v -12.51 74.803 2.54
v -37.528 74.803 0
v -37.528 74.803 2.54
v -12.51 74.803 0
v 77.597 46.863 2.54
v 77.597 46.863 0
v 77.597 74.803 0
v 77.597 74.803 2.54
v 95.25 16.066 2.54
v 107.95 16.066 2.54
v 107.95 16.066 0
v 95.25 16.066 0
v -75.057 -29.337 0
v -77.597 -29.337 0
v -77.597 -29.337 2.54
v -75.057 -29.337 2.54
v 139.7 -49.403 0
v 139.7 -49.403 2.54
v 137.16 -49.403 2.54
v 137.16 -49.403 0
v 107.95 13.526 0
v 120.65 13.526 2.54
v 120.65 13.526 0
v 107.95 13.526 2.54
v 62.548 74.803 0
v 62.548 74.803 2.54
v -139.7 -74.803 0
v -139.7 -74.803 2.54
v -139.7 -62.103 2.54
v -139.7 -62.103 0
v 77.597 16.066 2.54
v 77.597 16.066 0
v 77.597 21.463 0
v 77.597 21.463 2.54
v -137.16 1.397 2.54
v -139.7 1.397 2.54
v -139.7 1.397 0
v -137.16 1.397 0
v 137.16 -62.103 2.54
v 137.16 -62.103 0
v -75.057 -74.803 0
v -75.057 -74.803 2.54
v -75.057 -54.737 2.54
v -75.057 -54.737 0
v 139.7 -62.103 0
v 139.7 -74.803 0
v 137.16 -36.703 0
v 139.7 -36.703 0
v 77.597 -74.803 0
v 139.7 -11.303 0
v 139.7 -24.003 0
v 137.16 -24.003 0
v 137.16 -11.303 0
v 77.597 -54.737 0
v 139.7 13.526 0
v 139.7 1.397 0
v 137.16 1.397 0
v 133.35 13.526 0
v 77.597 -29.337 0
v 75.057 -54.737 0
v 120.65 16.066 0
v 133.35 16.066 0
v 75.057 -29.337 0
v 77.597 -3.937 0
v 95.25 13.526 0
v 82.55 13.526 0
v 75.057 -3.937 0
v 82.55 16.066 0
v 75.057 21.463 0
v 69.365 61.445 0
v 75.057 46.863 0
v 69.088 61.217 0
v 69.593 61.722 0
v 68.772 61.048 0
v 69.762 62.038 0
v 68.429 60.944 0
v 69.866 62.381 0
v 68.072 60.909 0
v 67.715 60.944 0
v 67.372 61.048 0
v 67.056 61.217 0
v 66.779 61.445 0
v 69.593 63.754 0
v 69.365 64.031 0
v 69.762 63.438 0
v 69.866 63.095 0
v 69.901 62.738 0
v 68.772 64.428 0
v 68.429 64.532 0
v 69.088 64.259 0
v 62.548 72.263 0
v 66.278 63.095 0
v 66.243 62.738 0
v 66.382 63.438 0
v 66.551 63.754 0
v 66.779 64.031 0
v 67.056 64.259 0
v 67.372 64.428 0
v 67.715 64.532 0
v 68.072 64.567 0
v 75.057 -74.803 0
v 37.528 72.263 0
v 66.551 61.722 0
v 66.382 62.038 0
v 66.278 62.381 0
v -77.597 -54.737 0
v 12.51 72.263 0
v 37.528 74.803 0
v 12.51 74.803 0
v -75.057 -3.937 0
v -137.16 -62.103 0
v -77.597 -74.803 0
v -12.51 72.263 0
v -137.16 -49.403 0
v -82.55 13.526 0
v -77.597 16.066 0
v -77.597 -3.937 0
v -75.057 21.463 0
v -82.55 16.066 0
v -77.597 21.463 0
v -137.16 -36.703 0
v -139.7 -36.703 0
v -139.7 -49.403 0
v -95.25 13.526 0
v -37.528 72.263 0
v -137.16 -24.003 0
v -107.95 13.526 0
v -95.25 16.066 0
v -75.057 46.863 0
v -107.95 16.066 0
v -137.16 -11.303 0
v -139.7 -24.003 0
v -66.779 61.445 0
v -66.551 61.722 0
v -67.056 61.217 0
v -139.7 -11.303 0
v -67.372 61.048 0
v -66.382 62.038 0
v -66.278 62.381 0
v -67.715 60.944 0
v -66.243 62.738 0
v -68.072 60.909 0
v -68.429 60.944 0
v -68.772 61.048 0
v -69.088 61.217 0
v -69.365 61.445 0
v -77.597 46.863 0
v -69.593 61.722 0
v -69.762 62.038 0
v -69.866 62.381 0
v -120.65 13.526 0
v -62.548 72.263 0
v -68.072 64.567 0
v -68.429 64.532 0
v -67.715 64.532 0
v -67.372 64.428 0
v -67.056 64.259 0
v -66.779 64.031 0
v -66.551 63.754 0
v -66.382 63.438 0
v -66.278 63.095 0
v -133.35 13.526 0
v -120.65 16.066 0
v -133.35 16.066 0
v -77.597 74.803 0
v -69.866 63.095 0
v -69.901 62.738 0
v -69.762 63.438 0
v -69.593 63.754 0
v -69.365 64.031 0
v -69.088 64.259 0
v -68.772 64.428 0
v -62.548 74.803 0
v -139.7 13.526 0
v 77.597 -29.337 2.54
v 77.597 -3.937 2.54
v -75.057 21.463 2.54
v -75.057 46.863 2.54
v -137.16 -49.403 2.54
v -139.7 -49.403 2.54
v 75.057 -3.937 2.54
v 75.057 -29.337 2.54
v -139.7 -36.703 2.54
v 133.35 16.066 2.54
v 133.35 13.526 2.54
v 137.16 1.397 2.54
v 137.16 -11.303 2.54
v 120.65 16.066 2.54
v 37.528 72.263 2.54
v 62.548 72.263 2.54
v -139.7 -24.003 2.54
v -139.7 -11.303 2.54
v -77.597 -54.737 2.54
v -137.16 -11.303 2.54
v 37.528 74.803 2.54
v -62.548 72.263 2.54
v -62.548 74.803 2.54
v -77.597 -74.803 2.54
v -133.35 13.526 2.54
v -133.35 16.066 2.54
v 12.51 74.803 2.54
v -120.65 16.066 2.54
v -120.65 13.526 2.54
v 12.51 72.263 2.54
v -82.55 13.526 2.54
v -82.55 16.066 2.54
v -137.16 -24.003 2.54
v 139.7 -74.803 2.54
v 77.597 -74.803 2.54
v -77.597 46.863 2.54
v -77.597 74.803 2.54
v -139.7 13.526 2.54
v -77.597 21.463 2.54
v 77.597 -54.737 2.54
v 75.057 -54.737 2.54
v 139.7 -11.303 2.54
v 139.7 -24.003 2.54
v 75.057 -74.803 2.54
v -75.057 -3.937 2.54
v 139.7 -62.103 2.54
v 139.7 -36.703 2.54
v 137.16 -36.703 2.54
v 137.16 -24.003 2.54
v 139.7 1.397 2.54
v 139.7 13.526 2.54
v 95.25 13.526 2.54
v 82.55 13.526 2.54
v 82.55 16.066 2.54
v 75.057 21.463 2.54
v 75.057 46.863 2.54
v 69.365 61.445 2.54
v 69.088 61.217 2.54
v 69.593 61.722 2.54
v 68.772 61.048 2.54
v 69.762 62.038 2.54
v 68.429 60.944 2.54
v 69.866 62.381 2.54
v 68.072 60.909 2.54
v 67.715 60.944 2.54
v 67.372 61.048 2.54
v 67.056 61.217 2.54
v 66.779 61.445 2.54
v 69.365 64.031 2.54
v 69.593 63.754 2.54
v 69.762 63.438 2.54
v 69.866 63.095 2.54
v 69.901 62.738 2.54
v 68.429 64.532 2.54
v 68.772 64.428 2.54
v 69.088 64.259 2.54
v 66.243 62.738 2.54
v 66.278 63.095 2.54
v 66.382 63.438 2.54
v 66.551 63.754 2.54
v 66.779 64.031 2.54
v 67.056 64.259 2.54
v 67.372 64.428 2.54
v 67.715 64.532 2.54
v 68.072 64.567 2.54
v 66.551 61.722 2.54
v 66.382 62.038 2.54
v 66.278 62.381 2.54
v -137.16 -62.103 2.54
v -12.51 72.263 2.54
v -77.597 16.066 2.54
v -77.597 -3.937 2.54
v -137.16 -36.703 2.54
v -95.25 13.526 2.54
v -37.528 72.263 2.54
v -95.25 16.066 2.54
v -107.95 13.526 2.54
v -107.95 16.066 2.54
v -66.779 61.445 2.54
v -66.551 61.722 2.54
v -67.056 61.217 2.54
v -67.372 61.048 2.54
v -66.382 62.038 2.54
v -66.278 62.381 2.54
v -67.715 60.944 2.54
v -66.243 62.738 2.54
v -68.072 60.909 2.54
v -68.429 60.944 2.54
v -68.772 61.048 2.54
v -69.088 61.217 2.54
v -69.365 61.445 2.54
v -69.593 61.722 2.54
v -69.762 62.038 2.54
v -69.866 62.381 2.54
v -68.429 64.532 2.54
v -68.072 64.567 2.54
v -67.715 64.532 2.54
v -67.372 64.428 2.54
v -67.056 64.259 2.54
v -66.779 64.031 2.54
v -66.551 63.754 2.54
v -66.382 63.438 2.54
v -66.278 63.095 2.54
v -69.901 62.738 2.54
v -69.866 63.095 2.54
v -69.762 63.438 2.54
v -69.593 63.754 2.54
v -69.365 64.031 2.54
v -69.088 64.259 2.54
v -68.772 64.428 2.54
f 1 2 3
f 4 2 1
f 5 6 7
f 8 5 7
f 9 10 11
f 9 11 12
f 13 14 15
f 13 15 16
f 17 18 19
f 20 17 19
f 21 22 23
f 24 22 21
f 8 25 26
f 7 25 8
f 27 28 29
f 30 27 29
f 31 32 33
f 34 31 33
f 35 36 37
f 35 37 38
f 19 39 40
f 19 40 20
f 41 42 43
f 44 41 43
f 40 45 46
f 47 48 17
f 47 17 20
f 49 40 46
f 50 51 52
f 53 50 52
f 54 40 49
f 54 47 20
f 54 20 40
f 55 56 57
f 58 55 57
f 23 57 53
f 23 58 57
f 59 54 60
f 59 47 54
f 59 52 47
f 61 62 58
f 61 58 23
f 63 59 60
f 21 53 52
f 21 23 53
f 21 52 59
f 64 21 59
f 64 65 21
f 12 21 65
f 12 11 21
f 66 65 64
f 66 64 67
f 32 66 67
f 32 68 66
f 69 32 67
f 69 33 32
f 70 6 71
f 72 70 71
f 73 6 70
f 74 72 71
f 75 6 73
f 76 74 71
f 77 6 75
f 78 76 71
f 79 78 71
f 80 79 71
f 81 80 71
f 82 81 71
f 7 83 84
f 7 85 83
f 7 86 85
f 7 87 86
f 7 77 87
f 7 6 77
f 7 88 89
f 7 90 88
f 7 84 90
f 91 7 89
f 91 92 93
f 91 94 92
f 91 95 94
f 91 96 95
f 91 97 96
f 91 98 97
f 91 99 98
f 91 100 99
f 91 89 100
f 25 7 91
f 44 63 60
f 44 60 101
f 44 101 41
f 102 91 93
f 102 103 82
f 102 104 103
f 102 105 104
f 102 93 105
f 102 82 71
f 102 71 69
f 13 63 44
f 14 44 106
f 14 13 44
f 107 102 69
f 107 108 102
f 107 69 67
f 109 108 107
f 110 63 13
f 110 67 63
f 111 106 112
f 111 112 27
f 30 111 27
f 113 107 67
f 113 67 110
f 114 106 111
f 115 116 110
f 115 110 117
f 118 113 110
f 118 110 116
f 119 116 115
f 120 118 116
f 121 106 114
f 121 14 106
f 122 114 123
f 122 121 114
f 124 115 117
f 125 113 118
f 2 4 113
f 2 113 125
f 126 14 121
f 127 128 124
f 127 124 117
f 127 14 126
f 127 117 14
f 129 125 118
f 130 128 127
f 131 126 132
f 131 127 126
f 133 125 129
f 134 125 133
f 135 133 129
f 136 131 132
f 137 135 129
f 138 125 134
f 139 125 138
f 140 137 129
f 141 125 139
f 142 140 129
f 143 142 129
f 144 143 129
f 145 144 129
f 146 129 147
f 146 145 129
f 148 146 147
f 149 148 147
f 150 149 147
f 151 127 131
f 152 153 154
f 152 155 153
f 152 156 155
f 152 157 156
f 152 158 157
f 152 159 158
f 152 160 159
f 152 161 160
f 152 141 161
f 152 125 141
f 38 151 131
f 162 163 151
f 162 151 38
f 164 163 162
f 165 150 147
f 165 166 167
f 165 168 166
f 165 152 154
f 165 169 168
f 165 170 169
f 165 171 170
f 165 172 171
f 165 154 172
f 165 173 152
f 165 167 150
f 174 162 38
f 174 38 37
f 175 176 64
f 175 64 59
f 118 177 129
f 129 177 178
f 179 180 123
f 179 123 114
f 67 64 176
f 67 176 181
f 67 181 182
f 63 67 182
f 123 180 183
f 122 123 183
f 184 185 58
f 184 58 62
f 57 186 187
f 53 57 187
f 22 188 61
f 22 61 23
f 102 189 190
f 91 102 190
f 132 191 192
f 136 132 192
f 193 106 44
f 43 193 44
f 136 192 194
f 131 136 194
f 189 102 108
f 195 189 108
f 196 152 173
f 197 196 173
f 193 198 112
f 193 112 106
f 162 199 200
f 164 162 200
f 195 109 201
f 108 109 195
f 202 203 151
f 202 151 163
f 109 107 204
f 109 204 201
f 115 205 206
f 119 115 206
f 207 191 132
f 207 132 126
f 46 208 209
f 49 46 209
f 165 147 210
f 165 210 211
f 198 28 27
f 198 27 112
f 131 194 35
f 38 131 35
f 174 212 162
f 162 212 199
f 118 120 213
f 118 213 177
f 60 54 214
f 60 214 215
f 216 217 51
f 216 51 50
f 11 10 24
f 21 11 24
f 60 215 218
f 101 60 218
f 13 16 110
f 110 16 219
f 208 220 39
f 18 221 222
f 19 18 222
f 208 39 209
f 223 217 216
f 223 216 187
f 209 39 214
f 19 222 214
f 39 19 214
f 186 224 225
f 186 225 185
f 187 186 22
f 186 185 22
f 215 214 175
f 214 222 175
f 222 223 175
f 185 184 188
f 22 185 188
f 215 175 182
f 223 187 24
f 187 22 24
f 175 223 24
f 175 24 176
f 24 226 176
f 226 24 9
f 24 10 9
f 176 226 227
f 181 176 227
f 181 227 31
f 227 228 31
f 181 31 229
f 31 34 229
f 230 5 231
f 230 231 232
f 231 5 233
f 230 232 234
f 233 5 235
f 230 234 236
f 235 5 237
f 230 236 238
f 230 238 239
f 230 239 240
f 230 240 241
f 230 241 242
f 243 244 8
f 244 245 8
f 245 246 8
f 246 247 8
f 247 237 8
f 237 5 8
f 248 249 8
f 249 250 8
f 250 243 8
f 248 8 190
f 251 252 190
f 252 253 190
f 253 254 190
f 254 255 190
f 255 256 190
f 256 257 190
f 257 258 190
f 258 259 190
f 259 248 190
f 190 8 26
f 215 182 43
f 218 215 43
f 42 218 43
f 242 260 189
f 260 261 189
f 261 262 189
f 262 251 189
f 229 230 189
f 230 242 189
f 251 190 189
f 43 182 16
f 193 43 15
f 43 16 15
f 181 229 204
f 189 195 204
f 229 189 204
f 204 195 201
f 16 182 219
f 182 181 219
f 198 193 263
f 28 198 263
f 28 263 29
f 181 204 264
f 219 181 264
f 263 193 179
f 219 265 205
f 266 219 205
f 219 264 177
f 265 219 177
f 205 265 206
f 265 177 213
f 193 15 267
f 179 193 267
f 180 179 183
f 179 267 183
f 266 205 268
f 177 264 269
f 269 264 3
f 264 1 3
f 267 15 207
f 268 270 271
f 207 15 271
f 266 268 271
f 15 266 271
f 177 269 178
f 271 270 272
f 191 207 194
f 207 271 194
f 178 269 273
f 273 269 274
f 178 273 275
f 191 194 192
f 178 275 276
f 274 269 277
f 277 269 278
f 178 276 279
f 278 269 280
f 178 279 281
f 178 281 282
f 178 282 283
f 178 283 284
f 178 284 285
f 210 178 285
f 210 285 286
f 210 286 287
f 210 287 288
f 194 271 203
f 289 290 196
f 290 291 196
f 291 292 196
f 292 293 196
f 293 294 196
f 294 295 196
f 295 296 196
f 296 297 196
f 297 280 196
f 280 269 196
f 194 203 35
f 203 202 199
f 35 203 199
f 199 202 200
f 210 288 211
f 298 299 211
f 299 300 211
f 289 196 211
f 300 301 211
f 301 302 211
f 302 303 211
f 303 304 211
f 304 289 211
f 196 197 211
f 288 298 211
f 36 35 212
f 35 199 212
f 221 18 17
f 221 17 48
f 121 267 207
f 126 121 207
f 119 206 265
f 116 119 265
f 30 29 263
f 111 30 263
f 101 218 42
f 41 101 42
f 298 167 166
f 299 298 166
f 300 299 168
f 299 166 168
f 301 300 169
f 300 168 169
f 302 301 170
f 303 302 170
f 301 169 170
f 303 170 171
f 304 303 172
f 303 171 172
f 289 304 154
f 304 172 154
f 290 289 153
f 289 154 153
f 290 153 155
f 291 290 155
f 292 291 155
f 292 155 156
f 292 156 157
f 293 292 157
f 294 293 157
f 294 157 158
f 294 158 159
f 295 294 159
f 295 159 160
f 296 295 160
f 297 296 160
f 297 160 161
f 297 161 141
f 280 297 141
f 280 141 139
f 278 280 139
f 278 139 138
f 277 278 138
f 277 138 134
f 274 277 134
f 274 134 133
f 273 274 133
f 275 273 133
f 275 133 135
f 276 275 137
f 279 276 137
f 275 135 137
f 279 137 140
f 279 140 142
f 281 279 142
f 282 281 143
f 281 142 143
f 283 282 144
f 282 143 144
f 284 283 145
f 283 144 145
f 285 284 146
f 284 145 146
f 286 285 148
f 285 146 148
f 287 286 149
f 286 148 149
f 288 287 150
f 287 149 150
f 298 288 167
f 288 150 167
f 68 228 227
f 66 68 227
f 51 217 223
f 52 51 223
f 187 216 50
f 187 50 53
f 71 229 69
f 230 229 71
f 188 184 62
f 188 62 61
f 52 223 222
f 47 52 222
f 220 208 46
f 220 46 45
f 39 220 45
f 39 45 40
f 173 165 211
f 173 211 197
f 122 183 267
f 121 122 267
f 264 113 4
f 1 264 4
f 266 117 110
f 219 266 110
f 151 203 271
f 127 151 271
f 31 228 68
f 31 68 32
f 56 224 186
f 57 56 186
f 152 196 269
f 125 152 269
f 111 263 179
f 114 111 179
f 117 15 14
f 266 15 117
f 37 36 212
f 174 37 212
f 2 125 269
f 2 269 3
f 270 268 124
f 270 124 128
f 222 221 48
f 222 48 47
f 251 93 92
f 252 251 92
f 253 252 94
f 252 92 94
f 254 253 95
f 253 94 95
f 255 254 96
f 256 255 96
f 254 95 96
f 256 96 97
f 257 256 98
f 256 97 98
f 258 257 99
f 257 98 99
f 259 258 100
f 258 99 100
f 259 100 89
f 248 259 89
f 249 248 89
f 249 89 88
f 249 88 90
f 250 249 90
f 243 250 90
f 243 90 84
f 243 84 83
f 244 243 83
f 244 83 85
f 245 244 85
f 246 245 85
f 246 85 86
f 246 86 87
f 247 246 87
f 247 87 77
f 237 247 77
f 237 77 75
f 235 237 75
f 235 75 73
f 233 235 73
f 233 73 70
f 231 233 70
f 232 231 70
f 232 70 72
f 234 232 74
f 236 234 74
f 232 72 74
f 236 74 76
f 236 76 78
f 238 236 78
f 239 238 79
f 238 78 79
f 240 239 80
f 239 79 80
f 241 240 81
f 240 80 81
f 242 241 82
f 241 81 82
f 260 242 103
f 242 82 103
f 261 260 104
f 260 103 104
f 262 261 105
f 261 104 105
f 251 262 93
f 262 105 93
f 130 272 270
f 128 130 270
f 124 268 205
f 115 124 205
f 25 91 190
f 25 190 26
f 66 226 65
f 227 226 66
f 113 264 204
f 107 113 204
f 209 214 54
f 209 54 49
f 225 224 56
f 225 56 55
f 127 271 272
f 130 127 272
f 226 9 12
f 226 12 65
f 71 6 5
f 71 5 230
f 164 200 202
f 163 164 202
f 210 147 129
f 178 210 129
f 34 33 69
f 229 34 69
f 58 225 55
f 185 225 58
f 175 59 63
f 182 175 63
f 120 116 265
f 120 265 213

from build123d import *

# Parameters (mm, degrees)
SKETCH1_W                 = 155.194
SKETCH1_H                 = 149.606
BOSS_EXTRUDE1_DEPTH       = 2.54
SKETCH2_W                 = 62.103
SKETCH2_H                 = 90.8685
BOSS_EXTRUDE2_DEPTH       = 2.54
SKETCH3_W                 = 2.54
SKETCH3_H                 = 25.4
CUT_EXTRUDE1_DEPTH        = 159.486688428
LPATTERN1_COUNT           = 3
LPATTERN1_PITCH           = 50.8
MIRROR1_COPY_1_SKETCH_W   = 2.54
MIRROR1_COPY_1_SKETCH_H   = 25.4
MIRROR1_COPY_1_DEPTH      = 159.486688428
MIRROR1_COPY_2_SKETCH_W   = 2.54
MIRROR1_COPY_2_SKETCH_H   = 25.4
MIRROR1_COPY_2_DEPTH      = 159.486688428
SKETCH4_W                 = 12.7
SKETCH4_H                 = 2.54
CUT_EXTRUDE2_DEPTH        = 159.486688428
LPATTERN2_COUNT           = 3
LPATTERN2_PITCH           = 25.4
MIRROR2_COPY_1_SKETCH_W   = 12.7
MIRROR2_COPY_1_SKETCH_H   = 2.54
MIRROR2_COPY_1_DEPTH      = 159.486688428
MIRROR2_COPY_2_SKETCH_W   = 12.7
MIRROR2_COPY_2_SKETCH_H   = 2.54
MIRROR2_COPY_2_DEPTH      = 159.486688428
SKETCH5_W                 = 2.54
SKETCH5_H                 = 12.7
CUT_EXTRUDE3_DEPTH        = 2.54
LPATTERN3_COUNT           = 4
LPATTERN3_PITCH           = 25.4
MIRROR3_COPY_1_SKETCH_W   = 2.54
MIRROR3_COPY_1_SKETCH_H   = 12.7
MIRROR3_COPY_1_DEPTH      = 2.54
MIRROR3_COPY_2_SKETCH_W   = 2.54
MIRROR3_COPY_2_SKETCH_H   = 12.7
MIRROR3_COPY_2_DEPTH      = 2.54
MIRROR3_COPY_3_SKETCH_W   = 2.54
MIRROR3_COPY_3_SKETCH_H   = 12.7
MIRROR3_COPY_3_DEPTH      = 2.54
SKETCH6_W                 = 25.019
SKETCH6_H                 = 2.54
CUT_EXTRUDE4_DEPTH        = 2.54
LPATTERN4_COUNT           = 3
LPATTERN4_PITCH           = 50.038
F_6_CLEARANCE_HOLE1_D     = 3.6576
F_6_CLEARANCE_HOLE1_DEPTH = 9.398
F_6_CLEARANCE_HOLE1_TIP   = 1.0988539


with BuildPart() as part:
    # Sketch1 → Boss-Extrude1 (new body)
    with BuildSketch(Plane.XY):
        Rectangle(SKETCH1_W, SKETCH1_H)
    extrude(amount=BOSS_EXTRUDE1_DEPTH)

    # Sketch2 → Boss-Extrude2 (add)
    with BuildSketch(Plane.XY.offset(2.54)):
        with Locations((-108.6485, -29.36875)):
            Rectangle(SKETCH2_W, SKETCH2_H)
    boss_extrude2 = extrude(amount=-BOSS_EXTRUDE2_DEPTH)

    # Sketch3 → Cut-Extrude1 (cut, through all)
    with BuildSketch(Plane.XY.offset(2.54)):
        with Locations((-76.327, 34.163)):
            Rectangle(SKETCH3_W, SKETCH3_H)
    cut_extrude1 = extrude(amount=-CUT_EXTRUDE1_DEPTH, mode=Mode.SUBTRACT)

    # LPattern1: Cut-Extrude1 ×3
    with Locations(*[(0, -i * LPATTERN1_PITCH, 0) for i in range(1, LPATTERN1_COUNT)]):
        add(cut_extrude1, mode=Mode.SUBTRACT)

    # Mirror1: Boss-Extrude2, Cut-Extrude1 across plane
    add(boss_extrude2.mirror(Plane(origin=(0, 0, 0), x_dir=(0, 0, 1), z_dir=(1, 0, 0))))
    add(cut_extrude1.mirror(Plane(origin=(0, 0, 0), x_dir=(0, 0, 1), z_dir=(1, 0, 0))), mode=Mode.SUBTRACT)

    # Mirror1 copy 1 sketch → Mirror1 copy 1 (cut, through all)
    with BuildSketch(Plane(origin=(0, -50.8, 2.54), x_dir=(-1, 0, 0), z_dir=(0, 0, 1))):
        with Locations((-76.327, -34.163)):
            Rectangle(MIRROR1_COPY_1_SKETCH_W, MIRROR1_COPY_1_SKETCH_H)
    extrude(amount=-MIRROR1_COPY_1_DEPTH, mode=Mode.SUBTRACT)

    # Mirror1 copy 2 sketch → Mirror1 copy 2 (cut, through all)
    with BuildSketch(Plane(origin=(0, -101.6, 2.54), x_dir=(-1, 0, 0), z_dir=(0, 0, 1))):
        with Locations((-76.327, -34.163)):
            Rectangle(MIRROR1_COPY_2_SKETCH_W, MIRROR1_COPY_2_SKETCH_H)
    extrude(amount=-MIRROR1_COPY_2_DEPTH, mode=Mode.SUBTRACT)

    # Sketch4 → Cut-Extrude2 (cut, through all)
    with BuildSketch(Plane.XY.offset(2.54)):
        with Locations((-139.7, 14.7955)):
            Rectangle(SKETCH4_W, SKETCH4_H)
    cut_extrude2 = extrude(amount=-CUT_EXTRUDE2_DEPTH, mode=Mode.SUBTRACT)

    # LPattern2: Cut-Extrude2 ×3
    with Locations(*[(i * LPATTERN2_PITCH, 0, 0) for i in range(1, LPATTERN2_COUNT)]):
        add(cut_extrude2, mode=Mode.SUBTRACT)

    # Mirror2: Cut-Extrude2 across plane
    add(cut_extrude2.mirror(Plane(origin=(0, 0, 0), x_dir=(0, 0, 1), z_dir=(1, 0, 0))), mode=Mode.SUBTRACT)

    # Mirror2 copy 1 sketch → Mirror2 copy 1 (cut, through all)
    with BuildSketch(Plane(origin=(-25.4, 0, 2.54), x_dir=(-1, 0, 0), z_dir=(0, 0, 1))):
        with Locations((-139.7, -14.7955)):
            Rectangle(MIRROR2_COPY_1_SKETCH_W, MIRROR2_COPY_1_SKETCH_H)
    extrude(amount=-MIRROR2_COPY_1_DEPTH, mode=Mode.SUBTRACT)

    # Mirror2 copy 2 sketch → Mirror2 copy 2 (cut, through all)
    with BuildSketch(Plane(origin=(-50.8, 0, 2.54), x_dir=(-1, 0, 0), z_dir=(0, 0, 1))):
        with Locations((-139.7, -14.7955)):
            Rectangle(MIRROR2_COPY_2_SKETCH_W, MIRROR2_COPY_2_SKETCH_H)
    extrude(amount=-MIRROR2_COPY_2_DEPTH, mode=Mode.SUBTRACT)

    # Sketch5 → Cut-Extrude3 (cut)
    with BuildSketch(Plane.XY.offset(2.54)):
        with Locations((-138.43, -55.753)):
            Rectangle(SKETCH5_W, SKETCH5_H)
    cut_extrude3 = extrude(amount=-CUT_EXTRUDE3_DEPTH, mode=Mode.SUBTRACT)

    # LPattern3: Cut-Extrude3 ×4
    with Locations(*[(0, i * LPATTERN3_PITCH, 0) for i in range(1, LPATTERN3_COUNT)]):
        add(cut_extrude3, mode=Mode.SUBTRACT)

    # Mirror3: Cut-Extrude3 across plane
    add(cut_extrude3.mirror(Plane(origin=(0, 0, 0), x_dir=(0, 0, 1), z_dir=(1, 0, 0))), mode=Mode.SUBTRACT)

    # Mirror3 copy 1 sketch → Mirror3 copy 1 (cut)
    with BuildSketch(Plane(origin=(0, 25.4, 2.54), x_dir=(-1, 0, 0), z_dir=(0, 0, 1))):
        with Locations((-138.43, 55.753)):
            Rectangle(MIRROR3_COPY_1_SKETCH_W, MIRROR3_COPY_1_SKETCH_H)
    extrude(amount=-MIRROR3_COPY_1_DEPTH, mode=Mode.SUBTRACT)

    # Mirror3 copy 2 sketch → Mirror3 copy 2 (cut)
    with BuildSketch(Plane(origin=(0, 50.8, 2.54), x_dir=(-1, 0, 0), z_dir=(0, 0, 1))):
        with Locations((-138.43, 55.753)):
            Rectangle(MIRROR3_COPY_2_SKETCH_W, MIRROR3_COPY_2_SKETCH_H)
    extrude(amount=-MIRROR3_COPY_2_DEPTH, mode=Mode.SUBTRACT)

    # Mirror3 copy 3 sketch → Mirror3 copy 3 (cut)
    with BuildSketch(Plane(origin=(0, 76.2, 2.54), x_dir=(-1, 0, 0), z_dir=(0, 0, 1))):
        with Locations((-138.43, 55.753)):
            Rectangle(MIRROR3_COPY_3_SKETCH_W, MIRROR3_COPY_3_SKETCH_H)
    extrude(amount=-MIRROR3_COPY_3_DEPTH, mode=Mode.SUBTRACT)

    # Sketch6 → Cut-Extrude4 (cut)
    with BuildSketch(Plane.XY.offset(2.54)):
        with Locations((-50.038, 73.533)):
            Rectangle(SKETCH6_W, SKETCH6_H)
    cut_extrude4 = extrude(amount=-CUT_EXTRUDE4_DEPTH, mode=Mode.SUBTRACT)

    # LPattern4: Cut-Extrude4 ×3
    with Locations(*[(i * LPATTERN4_PITCH, 0, 0) for i in range(1, LPATTERN4_COUNT)]):
        add(cut_extrude4, mode=Mode.SUBTRACT)

    # #6 Clearance Hole1
    with Locations(Plane.XY.offset(2.54)):
        with Locations((-68.072, 62.738), (68.072, 62.738)):
            Hole(F_6_CLEARANCE_HOLE1_D / 2, depth=F_6_CLEARANCE_HOLE1_DEPTH)
            with Locations((0, 0, -(F_6_CLEARANCE_HOLE1_DEPTH + F_6_CLEARANCE_HOLE1_TIP / 2))):  # 118° drill point
                Cone(0, F_6_CLEARANCE_HOLE1_D / 2, F_6_CLEARANCE_HOLE1_TIP, mode=Mode.SUBTRACT)


solid = part.part
